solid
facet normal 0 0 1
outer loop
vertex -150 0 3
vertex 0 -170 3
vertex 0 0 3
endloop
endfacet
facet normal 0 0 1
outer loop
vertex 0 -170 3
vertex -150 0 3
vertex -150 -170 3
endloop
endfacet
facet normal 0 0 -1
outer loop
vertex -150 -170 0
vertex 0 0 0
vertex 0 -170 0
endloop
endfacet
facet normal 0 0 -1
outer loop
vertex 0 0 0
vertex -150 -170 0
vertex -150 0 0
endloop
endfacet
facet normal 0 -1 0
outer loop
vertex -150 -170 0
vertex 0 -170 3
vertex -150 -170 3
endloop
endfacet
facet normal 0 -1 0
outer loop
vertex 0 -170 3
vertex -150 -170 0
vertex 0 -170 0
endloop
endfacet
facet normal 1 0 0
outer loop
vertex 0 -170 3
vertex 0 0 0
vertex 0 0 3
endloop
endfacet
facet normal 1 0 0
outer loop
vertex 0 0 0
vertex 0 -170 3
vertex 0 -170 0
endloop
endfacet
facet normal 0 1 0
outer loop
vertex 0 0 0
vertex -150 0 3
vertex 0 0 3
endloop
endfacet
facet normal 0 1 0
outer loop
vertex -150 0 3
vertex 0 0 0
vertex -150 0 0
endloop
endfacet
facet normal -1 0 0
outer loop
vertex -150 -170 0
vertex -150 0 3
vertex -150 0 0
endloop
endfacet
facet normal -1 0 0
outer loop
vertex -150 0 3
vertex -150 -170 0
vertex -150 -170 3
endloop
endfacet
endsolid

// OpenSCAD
//for apporopriate alignment of the grid
xoff = 28;
yoff = 29;
zoff = 2;
plat = 150;
plotXOff = -177.5;
plotYOff = -178.8;
scaleFac = 25.4;
t0 = "O";
t1 = "N";
t2 = "E";
t3 = "1";
f0 = "Letters/";
f1 = "Letters/";
f2 = "Letters/";
f3 = "Numbers/";
font = "_alpha.dxf";
braille = false;
//quadrant title offsets
qxoff = 40;
qyoff = 6;

//remove excess grid/plot
difference() {
	//align and union the grid and plot
	translate(v = [xoff,yoff,zoff]) { 
		union() {
			linear_extrude(file = "Grid/cleanGrid3.dxf", height = 3, center = false);
			if (braille) {
				translate(v=[-1*xoff,-1*yoff,0]) linear_extrude(file = "Grid/gridNumQ3.dxf", height = 5, center = false);
			} else { 
				translate(v=[-1*xoff,-1*yoff,0]) linear_extrude(file = "Grid/gridNumQ3_alpha.dxf", height = 5, center = false);
			}		
			translate(v=[plotXOff,plotYOff,0]){
				scale(v = [scaleFac,scaleFac,0]) linear_extrude(file = "Q3.dxf", height = 5, center = false);
			}
			
		}
	}
	
	//blocks to remove excess
	union() {
		translate(v=[0,-170,0]) cube(size = [20,180,10], center=false);
		translate(v=[-170,0,0]) cube(size = [175,20,10], center=false);
	}
}

//grid platform
translate(v=[-1*plat,-1*(plat+20),0]) cube(size = [plat,plat+20,3], center = false);
// title bar
first = -10;
translate(v=[first-45,-1*(plat+qyoff),zoff]) linear_extrude(file = str(f0,t0,font), height = 5 , center = false);
translate(v=[first-30,-1*(plat+qyoff),zoff]) linear_extrude(file = str(f1,t1,font), height = 5 , center = false);
translate(v=[first-15,-1*(plat+qyoff),zoff]) linear_extrude(file = str(f2,t2,font), height = 5 , center = false);
translate(v=[first,-1*(plat+qyoff),zoff]) linear_extrude(file = str(f3,t3,font), height = 5 , center = false);	
if (braille) {	
	translate(v=[-1*(plat-qxoff),-1*(plat+qyoff),zoff]) linear_extrude(file = "Grid/three.dxf", height = 5, center = false);
}else {
	translate(v=[-1*(plat-qxoff),-1*(plat+qyoff),zoff]) linear_extrude(file = "Grid/three_alpha.dxf", height = 5, center = false);
}
